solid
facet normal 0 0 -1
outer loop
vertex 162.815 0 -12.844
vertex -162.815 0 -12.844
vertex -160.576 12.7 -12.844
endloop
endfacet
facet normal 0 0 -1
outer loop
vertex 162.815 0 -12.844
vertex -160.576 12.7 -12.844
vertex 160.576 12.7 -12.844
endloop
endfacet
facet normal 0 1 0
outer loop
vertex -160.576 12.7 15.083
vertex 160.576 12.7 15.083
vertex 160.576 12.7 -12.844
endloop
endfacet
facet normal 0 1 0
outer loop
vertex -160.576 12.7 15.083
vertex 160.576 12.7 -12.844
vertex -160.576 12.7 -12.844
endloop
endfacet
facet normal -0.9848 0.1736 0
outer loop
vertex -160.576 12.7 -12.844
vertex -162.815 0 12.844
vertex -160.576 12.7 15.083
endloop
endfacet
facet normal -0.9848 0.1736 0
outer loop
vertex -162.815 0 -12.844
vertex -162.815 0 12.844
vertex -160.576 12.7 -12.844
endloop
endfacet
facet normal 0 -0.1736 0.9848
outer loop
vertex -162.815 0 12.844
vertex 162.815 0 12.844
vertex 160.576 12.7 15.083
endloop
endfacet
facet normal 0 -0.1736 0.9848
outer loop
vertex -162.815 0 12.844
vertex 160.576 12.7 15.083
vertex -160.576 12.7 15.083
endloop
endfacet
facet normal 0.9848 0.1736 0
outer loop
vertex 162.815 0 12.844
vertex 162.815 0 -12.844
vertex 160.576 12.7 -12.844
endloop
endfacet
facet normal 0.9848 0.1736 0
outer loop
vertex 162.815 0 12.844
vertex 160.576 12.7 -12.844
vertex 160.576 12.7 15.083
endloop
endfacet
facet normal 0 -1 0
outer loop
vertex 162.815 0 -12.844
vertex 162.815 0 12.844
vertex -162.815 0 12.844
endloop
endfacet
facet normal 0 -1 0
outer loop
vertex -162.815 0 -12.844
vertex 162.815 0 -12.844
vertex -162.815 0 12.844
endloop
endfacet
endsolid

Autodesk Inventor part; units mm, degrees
ref_plane "YZ Plane" through (0, 0, 0) normal (1, 0, 0) x (0, 1, 0)
ref_plane "XZ Plane" through (0, 0, 0) normal (0, 1, 0) x (-1, 0, 0)
ref_plane "XY Plane" through (0, 0, 0) normal (0, 0, 1) x (1, 0, 0)
sketch "Sketch1" plane through (0, 0, 0) normal (0, 1, 0) x (-1, 0, 0)
  line L0 (162.815, -12.8435) -> (-162.815, -12.8435)
  line L1 (-162.815, -12.8435) -> (-162.815, 12.8435)
  line L2 (-162.815, 12.8435) -> (162.815, 12.8435)
  line L3 (162.815, 12.8435) -> (162.815, -12.8435)
  point P0 (0, 0)
  point P1 (162.815, 0)
  point P2 (0, -12.8435)
  dimension "d0" = 325.63
  dimension "d2" = 25.687
extrude "Extrusion1" add sketch "Sketch1" along normal blind 12.7
draft "FaceDraft1" angle -10 pull direction (0, -1, 0) faces at (162.815, 8.4667, -4.2812) fixed edges at (162.815, 0, 0)
draft "FaceDraft2" angle -10 pull direction (0, -1, 0) faces at (-162.815, 8.4667, 4.2812) fixed edges at (-162.815, 0, 0)
draft "FaceDraft3" angle 10 pull direction (0, -1, 0) faces at (53.5252, 4.2333, 12.8435) fixed edges at (0, 0, 12.8435)
properties part number "Panel_front"
